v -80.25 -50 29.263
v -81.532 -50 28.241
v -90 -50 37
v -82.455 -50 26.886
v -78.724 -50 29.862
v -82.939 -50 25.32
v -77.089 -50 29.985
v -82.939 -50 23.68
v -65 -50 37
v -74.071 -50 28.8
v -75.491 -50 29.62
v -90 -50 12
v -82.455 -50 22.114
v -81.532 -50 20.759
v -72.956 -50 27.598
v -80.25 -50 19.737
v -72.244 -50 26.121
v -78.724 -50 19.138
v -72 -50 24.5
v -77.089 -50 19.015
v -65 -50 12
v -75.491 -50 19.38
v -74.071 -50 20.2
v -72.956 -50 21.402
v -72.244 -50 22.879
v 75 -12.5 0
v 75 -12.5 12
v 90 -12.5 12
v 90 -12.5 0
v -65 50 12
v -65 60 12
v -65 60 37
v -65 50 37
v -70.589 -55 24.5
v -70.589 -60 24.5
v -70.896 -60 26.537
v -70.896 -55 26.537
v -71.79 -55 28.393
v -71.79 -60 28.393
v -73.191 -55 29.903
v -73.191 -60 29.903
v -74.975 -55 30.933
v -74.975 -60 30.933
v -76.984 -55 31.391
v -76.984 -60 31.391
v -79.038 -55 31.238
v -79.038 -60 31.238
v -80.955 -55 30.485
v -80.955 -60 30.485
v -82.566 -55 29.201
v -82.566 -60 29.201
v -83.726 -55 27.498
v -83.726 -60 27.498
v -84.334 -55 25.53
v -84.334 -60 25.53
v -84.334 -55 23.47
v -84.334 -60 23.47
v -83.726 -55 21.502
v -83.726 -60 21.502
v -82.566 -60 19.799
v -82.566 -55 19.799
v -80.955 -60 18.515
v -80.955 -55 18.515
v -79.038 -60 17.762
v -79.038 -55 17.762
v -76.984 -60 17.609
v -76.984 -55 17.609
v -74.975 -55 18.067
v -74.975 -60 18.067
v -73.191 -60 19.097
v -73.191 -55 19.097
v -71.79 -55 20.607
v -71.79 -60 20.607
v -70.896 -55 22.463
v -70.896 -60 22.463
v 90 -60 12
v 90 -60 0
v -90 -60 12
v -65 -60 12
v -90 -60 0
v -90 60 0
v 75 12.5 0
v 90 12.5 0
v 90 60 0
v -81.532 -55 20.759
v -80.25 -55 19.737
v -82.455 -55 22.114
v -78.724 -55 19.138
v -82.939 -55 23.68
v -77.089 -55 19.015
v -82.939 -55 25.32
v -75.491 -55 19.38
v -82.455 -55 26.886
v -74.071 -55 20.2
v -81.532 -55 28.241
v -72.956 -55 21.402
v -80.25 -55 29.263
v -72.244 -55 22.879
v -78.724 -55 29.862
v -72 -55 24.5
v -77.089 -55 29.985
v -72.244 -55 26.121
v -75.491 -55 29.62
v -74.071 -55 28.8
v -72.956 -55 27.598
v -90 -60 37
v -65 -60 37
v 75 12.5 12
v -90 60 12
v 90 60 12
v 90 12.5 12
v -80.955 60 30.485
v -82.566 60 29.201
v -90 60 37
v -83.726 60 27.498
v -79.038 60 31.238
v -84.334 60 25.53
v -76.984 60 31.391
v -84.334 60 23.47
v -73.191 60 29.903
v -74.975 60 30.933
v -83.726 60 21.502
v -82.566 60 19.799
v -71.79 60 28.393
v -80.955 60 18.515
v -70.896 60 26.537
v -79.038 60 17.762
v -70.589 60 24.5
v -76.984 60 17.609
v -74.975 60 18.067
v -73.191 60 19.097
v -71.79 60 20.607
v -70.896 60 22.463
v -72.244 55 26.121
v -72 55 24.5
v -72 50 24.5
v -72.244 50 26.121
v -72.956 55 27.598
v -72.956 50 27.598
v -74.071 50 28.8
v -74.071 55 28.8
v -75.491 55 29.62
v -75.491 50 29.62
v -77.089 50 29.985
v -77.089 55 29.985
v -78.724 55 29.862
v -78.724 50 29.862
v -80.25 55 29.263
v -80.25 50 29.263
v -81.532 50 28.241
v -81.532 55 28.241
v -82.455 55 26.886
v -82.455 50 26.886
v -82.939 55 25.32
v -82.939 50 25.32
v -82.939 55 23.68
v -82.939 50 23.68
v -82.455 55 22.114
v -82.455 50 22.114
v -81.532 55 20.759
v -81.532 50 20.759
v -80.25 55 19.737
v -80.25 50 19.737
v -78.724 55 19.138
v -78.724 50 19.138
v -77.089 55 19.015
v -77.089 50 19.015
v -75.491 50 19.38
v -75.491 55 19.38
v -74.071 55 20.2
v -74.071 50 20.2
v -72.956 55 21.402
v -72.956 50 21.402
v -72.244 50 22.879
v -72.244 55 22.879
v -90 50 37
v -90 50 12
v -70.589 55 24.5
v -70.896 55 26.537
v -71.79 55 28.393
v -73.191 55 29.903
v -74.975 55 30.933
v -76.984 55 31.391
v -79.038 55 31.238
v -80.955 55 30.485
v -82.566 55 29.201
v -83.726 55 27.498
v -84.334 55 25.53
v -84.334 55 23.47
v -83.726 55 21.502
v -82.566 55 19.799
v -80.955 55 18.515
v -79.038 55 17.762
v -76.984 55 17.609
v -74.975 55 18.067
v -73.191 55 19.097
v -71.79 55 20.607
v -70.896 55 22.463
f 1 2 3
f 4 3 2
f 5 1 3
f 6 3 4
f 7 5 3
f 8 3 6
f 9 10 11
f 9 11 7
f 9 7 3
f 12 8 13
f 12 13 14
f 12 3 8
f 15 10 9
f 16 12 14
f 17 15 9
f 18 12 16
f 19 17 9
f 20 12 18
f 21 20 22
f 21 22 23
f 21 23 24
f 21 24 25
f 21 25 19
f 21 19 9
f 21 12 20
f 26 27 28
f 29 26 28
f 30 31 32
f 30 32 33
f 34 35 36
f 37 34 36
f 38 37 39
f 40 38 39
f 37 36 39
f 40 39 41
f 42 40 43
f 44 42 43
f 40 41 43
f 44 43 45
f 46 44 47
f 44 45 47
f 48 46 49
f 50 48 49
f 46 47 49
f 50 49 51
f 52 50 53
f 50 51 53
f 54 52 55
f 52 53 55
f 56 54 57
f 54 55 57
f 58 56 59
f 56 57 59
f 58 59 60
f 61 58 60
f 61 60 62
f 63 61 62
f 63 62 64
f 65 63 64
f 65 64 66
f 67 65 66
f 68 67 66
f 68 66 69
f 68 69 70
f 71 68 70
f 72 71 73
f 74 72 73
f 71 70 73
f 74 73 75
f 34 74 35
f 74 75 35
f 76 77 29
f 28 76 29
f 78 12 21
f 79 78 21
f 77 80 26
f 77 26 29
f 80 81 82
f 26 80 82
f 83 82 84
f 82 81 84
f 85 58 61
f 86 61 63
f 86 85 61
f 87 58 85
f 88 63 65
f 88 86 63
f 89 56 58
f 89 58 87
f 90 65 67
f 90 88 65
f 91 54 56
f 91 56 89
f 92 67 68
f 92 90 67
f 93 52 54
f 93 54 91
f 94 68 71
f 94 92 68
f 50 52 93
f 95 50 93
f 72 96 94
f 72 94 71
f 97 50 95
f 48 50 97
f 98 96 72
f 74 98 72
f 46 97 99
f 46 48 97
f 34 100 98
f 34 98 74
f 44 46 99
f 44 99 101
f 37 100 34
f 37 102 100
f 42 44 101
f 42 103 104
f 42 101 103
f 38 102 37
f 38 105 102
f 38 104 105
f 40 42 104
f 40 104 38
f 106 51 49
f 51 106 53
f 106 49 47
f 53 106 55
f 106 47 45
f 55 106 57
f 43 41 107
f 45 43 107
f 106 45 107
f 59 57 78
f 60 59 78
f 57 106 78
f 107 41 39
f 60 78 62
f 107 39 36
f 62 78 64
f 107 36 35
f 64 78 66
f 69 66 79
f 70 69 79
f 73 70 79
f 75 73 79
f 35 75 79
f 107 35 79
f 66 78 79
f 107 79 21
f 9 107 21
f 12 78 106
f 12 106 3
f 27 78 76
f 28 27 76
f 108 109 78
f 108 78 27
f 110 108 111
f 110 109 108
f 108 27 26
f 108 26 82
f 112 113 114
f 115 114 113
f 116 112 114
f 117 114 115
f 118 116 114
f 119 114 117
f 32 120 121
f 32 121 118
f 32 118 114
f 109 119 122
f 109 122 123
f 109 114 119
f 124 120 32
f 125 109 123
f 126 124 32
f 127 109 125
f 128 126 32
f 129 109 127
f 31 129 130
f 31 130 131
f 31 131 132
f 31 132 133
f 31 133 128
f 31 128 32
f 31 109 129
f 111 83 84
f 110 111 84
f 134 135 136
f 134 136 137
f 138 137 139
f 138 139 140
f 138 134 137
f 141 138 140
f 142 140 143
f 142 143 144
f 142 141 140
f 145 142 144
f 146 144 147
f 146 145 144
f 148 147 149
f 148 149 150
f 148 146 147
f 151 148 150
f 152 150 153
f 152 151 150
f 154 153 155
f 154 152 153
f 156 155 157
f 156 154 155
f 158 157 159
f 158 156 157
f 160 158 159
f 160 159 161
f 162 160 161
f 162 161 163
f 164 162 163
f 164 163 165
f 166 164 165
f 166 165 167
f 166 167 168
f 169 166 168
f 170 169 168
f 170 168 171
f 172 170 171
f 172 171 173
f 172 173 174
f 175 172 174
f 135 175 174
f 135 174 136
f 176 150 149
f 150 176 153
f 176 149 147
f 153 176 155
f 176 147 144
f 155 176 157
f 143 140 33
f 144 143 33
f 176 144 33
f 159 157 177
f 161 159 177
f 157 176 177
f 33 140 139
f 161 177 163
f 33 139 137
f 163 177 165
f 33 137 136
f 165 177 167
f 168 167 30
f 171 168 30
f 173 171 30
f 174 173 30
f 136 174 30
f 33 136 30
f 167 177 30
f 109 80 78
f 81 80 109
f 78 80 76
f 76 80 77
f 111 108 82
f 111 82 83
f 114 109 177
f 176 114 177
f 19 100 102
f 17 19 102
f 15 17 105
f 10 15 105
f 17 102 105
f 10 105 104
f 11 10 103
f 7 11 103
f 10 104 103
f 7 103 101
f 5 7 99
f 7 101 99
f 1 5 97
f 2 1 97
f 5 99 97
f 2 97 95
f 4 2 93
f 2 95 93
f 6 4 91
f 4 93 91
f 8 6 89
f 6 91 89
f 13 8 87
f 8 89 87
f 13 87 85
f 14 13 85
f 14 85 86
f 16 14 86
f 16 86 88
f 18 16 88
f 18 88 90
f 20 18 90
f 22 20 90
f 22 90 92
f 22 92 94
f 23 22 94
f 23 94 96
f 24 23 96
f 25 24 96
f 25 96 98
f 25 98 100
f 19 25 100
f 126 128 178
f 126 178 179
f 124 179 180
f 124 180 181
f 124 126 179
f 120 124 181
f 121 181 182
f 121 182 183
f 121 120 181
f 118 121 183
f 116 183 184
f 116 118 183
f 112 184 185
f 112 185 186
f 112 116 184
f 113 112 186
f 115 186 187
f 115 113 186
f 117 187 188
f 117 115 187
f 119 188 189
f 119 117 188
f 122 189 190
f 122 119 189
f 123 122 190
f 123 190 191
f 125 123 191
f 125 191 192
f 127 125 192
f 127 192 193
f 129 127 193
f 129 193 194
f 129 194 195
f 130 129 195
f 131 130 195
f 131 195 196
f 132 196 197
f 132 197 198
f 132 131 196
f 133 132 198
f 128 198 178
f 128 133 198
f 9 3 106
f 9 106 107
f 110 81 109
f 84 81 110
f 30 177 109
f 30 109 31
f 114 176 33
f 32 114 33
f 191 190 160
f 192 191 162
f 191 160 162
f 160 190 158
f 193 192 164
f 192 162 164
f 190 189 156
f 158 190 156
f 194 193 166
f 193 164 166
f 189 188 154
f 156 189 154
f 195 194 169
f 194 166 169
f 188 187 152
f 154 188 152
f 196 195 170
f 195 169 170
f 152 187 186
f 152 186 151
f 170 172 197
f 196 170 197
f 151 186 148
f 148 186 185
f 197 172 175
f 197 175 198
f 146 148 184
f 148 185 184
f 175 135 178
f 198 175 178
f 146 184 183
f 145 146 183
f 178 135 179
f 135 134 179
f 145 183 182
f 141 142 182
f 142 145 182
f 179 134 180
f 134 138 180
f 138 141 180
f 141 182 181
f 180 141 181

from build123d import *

# Parameters (mm, degrees)
F0_W      = 180
F0_H      = 120
F1_DEPTH  = 12
F2_W      = 25
F2_H      = 10
F3_DEPTH  = 25
F4_R      = 6.910817
F5_DEPTH  = 5
F6_R      = 5.5
F7_DEPTH  = 200
F9_W      = 15
F9_H      = 25
F10_DEPTH = 25


with BuildPart() as f1:
    # F0 (on Top) → F1 (new body)
    with BuildSketch(Plane.XY):
        Rectangle(F0_W, F0_H)
    extrude(amount=F1_DEPTH)

    # F9 (on face) → F10 (cut)
    with BuildSketch(Plane.XY.offset(12)):
        with Locations((82.5, 0)):
            Rectangle(F9_W, F9_H)
    extrude(amount=-F10_DEPTH, mode=Mode.SUBTRACT)


with BuildPart() as f3:
    # F2 (on face) → F3 (new body)
    with BuildSketch(Plane.XY.offset(12)):
        with Locations((-77.5, -55)):
            Rectangle(F2_W, F2_H)
    extrude(amount=F3_DEPTH)

    # F4 (on face) → F5 (cut)
    with BuildSketch(Plane.XZ.offset(60)):
        with Locations((-77.5, 24.5)):
            Circle(F4_R)
    extrude(amount=-F5_DEPTH, mode=Mode.SUBTRACT)

    # F6 (on face) → F7 (cut)
    with BuildSketch(Plane.XZ.offset(55)):
        with Locations((-77.5, 24.5)):
            Circle(F6_R)
    extrude(amount=-F7_DEPTH, mode=Mode.SUBTRACT)


with BuildPart() as f8_1:
    # F8: instance of F3
    add(f3.part.mirror(Plane.XZ))


solid = Compound([f1.part, f3.part, f8_1.part])
